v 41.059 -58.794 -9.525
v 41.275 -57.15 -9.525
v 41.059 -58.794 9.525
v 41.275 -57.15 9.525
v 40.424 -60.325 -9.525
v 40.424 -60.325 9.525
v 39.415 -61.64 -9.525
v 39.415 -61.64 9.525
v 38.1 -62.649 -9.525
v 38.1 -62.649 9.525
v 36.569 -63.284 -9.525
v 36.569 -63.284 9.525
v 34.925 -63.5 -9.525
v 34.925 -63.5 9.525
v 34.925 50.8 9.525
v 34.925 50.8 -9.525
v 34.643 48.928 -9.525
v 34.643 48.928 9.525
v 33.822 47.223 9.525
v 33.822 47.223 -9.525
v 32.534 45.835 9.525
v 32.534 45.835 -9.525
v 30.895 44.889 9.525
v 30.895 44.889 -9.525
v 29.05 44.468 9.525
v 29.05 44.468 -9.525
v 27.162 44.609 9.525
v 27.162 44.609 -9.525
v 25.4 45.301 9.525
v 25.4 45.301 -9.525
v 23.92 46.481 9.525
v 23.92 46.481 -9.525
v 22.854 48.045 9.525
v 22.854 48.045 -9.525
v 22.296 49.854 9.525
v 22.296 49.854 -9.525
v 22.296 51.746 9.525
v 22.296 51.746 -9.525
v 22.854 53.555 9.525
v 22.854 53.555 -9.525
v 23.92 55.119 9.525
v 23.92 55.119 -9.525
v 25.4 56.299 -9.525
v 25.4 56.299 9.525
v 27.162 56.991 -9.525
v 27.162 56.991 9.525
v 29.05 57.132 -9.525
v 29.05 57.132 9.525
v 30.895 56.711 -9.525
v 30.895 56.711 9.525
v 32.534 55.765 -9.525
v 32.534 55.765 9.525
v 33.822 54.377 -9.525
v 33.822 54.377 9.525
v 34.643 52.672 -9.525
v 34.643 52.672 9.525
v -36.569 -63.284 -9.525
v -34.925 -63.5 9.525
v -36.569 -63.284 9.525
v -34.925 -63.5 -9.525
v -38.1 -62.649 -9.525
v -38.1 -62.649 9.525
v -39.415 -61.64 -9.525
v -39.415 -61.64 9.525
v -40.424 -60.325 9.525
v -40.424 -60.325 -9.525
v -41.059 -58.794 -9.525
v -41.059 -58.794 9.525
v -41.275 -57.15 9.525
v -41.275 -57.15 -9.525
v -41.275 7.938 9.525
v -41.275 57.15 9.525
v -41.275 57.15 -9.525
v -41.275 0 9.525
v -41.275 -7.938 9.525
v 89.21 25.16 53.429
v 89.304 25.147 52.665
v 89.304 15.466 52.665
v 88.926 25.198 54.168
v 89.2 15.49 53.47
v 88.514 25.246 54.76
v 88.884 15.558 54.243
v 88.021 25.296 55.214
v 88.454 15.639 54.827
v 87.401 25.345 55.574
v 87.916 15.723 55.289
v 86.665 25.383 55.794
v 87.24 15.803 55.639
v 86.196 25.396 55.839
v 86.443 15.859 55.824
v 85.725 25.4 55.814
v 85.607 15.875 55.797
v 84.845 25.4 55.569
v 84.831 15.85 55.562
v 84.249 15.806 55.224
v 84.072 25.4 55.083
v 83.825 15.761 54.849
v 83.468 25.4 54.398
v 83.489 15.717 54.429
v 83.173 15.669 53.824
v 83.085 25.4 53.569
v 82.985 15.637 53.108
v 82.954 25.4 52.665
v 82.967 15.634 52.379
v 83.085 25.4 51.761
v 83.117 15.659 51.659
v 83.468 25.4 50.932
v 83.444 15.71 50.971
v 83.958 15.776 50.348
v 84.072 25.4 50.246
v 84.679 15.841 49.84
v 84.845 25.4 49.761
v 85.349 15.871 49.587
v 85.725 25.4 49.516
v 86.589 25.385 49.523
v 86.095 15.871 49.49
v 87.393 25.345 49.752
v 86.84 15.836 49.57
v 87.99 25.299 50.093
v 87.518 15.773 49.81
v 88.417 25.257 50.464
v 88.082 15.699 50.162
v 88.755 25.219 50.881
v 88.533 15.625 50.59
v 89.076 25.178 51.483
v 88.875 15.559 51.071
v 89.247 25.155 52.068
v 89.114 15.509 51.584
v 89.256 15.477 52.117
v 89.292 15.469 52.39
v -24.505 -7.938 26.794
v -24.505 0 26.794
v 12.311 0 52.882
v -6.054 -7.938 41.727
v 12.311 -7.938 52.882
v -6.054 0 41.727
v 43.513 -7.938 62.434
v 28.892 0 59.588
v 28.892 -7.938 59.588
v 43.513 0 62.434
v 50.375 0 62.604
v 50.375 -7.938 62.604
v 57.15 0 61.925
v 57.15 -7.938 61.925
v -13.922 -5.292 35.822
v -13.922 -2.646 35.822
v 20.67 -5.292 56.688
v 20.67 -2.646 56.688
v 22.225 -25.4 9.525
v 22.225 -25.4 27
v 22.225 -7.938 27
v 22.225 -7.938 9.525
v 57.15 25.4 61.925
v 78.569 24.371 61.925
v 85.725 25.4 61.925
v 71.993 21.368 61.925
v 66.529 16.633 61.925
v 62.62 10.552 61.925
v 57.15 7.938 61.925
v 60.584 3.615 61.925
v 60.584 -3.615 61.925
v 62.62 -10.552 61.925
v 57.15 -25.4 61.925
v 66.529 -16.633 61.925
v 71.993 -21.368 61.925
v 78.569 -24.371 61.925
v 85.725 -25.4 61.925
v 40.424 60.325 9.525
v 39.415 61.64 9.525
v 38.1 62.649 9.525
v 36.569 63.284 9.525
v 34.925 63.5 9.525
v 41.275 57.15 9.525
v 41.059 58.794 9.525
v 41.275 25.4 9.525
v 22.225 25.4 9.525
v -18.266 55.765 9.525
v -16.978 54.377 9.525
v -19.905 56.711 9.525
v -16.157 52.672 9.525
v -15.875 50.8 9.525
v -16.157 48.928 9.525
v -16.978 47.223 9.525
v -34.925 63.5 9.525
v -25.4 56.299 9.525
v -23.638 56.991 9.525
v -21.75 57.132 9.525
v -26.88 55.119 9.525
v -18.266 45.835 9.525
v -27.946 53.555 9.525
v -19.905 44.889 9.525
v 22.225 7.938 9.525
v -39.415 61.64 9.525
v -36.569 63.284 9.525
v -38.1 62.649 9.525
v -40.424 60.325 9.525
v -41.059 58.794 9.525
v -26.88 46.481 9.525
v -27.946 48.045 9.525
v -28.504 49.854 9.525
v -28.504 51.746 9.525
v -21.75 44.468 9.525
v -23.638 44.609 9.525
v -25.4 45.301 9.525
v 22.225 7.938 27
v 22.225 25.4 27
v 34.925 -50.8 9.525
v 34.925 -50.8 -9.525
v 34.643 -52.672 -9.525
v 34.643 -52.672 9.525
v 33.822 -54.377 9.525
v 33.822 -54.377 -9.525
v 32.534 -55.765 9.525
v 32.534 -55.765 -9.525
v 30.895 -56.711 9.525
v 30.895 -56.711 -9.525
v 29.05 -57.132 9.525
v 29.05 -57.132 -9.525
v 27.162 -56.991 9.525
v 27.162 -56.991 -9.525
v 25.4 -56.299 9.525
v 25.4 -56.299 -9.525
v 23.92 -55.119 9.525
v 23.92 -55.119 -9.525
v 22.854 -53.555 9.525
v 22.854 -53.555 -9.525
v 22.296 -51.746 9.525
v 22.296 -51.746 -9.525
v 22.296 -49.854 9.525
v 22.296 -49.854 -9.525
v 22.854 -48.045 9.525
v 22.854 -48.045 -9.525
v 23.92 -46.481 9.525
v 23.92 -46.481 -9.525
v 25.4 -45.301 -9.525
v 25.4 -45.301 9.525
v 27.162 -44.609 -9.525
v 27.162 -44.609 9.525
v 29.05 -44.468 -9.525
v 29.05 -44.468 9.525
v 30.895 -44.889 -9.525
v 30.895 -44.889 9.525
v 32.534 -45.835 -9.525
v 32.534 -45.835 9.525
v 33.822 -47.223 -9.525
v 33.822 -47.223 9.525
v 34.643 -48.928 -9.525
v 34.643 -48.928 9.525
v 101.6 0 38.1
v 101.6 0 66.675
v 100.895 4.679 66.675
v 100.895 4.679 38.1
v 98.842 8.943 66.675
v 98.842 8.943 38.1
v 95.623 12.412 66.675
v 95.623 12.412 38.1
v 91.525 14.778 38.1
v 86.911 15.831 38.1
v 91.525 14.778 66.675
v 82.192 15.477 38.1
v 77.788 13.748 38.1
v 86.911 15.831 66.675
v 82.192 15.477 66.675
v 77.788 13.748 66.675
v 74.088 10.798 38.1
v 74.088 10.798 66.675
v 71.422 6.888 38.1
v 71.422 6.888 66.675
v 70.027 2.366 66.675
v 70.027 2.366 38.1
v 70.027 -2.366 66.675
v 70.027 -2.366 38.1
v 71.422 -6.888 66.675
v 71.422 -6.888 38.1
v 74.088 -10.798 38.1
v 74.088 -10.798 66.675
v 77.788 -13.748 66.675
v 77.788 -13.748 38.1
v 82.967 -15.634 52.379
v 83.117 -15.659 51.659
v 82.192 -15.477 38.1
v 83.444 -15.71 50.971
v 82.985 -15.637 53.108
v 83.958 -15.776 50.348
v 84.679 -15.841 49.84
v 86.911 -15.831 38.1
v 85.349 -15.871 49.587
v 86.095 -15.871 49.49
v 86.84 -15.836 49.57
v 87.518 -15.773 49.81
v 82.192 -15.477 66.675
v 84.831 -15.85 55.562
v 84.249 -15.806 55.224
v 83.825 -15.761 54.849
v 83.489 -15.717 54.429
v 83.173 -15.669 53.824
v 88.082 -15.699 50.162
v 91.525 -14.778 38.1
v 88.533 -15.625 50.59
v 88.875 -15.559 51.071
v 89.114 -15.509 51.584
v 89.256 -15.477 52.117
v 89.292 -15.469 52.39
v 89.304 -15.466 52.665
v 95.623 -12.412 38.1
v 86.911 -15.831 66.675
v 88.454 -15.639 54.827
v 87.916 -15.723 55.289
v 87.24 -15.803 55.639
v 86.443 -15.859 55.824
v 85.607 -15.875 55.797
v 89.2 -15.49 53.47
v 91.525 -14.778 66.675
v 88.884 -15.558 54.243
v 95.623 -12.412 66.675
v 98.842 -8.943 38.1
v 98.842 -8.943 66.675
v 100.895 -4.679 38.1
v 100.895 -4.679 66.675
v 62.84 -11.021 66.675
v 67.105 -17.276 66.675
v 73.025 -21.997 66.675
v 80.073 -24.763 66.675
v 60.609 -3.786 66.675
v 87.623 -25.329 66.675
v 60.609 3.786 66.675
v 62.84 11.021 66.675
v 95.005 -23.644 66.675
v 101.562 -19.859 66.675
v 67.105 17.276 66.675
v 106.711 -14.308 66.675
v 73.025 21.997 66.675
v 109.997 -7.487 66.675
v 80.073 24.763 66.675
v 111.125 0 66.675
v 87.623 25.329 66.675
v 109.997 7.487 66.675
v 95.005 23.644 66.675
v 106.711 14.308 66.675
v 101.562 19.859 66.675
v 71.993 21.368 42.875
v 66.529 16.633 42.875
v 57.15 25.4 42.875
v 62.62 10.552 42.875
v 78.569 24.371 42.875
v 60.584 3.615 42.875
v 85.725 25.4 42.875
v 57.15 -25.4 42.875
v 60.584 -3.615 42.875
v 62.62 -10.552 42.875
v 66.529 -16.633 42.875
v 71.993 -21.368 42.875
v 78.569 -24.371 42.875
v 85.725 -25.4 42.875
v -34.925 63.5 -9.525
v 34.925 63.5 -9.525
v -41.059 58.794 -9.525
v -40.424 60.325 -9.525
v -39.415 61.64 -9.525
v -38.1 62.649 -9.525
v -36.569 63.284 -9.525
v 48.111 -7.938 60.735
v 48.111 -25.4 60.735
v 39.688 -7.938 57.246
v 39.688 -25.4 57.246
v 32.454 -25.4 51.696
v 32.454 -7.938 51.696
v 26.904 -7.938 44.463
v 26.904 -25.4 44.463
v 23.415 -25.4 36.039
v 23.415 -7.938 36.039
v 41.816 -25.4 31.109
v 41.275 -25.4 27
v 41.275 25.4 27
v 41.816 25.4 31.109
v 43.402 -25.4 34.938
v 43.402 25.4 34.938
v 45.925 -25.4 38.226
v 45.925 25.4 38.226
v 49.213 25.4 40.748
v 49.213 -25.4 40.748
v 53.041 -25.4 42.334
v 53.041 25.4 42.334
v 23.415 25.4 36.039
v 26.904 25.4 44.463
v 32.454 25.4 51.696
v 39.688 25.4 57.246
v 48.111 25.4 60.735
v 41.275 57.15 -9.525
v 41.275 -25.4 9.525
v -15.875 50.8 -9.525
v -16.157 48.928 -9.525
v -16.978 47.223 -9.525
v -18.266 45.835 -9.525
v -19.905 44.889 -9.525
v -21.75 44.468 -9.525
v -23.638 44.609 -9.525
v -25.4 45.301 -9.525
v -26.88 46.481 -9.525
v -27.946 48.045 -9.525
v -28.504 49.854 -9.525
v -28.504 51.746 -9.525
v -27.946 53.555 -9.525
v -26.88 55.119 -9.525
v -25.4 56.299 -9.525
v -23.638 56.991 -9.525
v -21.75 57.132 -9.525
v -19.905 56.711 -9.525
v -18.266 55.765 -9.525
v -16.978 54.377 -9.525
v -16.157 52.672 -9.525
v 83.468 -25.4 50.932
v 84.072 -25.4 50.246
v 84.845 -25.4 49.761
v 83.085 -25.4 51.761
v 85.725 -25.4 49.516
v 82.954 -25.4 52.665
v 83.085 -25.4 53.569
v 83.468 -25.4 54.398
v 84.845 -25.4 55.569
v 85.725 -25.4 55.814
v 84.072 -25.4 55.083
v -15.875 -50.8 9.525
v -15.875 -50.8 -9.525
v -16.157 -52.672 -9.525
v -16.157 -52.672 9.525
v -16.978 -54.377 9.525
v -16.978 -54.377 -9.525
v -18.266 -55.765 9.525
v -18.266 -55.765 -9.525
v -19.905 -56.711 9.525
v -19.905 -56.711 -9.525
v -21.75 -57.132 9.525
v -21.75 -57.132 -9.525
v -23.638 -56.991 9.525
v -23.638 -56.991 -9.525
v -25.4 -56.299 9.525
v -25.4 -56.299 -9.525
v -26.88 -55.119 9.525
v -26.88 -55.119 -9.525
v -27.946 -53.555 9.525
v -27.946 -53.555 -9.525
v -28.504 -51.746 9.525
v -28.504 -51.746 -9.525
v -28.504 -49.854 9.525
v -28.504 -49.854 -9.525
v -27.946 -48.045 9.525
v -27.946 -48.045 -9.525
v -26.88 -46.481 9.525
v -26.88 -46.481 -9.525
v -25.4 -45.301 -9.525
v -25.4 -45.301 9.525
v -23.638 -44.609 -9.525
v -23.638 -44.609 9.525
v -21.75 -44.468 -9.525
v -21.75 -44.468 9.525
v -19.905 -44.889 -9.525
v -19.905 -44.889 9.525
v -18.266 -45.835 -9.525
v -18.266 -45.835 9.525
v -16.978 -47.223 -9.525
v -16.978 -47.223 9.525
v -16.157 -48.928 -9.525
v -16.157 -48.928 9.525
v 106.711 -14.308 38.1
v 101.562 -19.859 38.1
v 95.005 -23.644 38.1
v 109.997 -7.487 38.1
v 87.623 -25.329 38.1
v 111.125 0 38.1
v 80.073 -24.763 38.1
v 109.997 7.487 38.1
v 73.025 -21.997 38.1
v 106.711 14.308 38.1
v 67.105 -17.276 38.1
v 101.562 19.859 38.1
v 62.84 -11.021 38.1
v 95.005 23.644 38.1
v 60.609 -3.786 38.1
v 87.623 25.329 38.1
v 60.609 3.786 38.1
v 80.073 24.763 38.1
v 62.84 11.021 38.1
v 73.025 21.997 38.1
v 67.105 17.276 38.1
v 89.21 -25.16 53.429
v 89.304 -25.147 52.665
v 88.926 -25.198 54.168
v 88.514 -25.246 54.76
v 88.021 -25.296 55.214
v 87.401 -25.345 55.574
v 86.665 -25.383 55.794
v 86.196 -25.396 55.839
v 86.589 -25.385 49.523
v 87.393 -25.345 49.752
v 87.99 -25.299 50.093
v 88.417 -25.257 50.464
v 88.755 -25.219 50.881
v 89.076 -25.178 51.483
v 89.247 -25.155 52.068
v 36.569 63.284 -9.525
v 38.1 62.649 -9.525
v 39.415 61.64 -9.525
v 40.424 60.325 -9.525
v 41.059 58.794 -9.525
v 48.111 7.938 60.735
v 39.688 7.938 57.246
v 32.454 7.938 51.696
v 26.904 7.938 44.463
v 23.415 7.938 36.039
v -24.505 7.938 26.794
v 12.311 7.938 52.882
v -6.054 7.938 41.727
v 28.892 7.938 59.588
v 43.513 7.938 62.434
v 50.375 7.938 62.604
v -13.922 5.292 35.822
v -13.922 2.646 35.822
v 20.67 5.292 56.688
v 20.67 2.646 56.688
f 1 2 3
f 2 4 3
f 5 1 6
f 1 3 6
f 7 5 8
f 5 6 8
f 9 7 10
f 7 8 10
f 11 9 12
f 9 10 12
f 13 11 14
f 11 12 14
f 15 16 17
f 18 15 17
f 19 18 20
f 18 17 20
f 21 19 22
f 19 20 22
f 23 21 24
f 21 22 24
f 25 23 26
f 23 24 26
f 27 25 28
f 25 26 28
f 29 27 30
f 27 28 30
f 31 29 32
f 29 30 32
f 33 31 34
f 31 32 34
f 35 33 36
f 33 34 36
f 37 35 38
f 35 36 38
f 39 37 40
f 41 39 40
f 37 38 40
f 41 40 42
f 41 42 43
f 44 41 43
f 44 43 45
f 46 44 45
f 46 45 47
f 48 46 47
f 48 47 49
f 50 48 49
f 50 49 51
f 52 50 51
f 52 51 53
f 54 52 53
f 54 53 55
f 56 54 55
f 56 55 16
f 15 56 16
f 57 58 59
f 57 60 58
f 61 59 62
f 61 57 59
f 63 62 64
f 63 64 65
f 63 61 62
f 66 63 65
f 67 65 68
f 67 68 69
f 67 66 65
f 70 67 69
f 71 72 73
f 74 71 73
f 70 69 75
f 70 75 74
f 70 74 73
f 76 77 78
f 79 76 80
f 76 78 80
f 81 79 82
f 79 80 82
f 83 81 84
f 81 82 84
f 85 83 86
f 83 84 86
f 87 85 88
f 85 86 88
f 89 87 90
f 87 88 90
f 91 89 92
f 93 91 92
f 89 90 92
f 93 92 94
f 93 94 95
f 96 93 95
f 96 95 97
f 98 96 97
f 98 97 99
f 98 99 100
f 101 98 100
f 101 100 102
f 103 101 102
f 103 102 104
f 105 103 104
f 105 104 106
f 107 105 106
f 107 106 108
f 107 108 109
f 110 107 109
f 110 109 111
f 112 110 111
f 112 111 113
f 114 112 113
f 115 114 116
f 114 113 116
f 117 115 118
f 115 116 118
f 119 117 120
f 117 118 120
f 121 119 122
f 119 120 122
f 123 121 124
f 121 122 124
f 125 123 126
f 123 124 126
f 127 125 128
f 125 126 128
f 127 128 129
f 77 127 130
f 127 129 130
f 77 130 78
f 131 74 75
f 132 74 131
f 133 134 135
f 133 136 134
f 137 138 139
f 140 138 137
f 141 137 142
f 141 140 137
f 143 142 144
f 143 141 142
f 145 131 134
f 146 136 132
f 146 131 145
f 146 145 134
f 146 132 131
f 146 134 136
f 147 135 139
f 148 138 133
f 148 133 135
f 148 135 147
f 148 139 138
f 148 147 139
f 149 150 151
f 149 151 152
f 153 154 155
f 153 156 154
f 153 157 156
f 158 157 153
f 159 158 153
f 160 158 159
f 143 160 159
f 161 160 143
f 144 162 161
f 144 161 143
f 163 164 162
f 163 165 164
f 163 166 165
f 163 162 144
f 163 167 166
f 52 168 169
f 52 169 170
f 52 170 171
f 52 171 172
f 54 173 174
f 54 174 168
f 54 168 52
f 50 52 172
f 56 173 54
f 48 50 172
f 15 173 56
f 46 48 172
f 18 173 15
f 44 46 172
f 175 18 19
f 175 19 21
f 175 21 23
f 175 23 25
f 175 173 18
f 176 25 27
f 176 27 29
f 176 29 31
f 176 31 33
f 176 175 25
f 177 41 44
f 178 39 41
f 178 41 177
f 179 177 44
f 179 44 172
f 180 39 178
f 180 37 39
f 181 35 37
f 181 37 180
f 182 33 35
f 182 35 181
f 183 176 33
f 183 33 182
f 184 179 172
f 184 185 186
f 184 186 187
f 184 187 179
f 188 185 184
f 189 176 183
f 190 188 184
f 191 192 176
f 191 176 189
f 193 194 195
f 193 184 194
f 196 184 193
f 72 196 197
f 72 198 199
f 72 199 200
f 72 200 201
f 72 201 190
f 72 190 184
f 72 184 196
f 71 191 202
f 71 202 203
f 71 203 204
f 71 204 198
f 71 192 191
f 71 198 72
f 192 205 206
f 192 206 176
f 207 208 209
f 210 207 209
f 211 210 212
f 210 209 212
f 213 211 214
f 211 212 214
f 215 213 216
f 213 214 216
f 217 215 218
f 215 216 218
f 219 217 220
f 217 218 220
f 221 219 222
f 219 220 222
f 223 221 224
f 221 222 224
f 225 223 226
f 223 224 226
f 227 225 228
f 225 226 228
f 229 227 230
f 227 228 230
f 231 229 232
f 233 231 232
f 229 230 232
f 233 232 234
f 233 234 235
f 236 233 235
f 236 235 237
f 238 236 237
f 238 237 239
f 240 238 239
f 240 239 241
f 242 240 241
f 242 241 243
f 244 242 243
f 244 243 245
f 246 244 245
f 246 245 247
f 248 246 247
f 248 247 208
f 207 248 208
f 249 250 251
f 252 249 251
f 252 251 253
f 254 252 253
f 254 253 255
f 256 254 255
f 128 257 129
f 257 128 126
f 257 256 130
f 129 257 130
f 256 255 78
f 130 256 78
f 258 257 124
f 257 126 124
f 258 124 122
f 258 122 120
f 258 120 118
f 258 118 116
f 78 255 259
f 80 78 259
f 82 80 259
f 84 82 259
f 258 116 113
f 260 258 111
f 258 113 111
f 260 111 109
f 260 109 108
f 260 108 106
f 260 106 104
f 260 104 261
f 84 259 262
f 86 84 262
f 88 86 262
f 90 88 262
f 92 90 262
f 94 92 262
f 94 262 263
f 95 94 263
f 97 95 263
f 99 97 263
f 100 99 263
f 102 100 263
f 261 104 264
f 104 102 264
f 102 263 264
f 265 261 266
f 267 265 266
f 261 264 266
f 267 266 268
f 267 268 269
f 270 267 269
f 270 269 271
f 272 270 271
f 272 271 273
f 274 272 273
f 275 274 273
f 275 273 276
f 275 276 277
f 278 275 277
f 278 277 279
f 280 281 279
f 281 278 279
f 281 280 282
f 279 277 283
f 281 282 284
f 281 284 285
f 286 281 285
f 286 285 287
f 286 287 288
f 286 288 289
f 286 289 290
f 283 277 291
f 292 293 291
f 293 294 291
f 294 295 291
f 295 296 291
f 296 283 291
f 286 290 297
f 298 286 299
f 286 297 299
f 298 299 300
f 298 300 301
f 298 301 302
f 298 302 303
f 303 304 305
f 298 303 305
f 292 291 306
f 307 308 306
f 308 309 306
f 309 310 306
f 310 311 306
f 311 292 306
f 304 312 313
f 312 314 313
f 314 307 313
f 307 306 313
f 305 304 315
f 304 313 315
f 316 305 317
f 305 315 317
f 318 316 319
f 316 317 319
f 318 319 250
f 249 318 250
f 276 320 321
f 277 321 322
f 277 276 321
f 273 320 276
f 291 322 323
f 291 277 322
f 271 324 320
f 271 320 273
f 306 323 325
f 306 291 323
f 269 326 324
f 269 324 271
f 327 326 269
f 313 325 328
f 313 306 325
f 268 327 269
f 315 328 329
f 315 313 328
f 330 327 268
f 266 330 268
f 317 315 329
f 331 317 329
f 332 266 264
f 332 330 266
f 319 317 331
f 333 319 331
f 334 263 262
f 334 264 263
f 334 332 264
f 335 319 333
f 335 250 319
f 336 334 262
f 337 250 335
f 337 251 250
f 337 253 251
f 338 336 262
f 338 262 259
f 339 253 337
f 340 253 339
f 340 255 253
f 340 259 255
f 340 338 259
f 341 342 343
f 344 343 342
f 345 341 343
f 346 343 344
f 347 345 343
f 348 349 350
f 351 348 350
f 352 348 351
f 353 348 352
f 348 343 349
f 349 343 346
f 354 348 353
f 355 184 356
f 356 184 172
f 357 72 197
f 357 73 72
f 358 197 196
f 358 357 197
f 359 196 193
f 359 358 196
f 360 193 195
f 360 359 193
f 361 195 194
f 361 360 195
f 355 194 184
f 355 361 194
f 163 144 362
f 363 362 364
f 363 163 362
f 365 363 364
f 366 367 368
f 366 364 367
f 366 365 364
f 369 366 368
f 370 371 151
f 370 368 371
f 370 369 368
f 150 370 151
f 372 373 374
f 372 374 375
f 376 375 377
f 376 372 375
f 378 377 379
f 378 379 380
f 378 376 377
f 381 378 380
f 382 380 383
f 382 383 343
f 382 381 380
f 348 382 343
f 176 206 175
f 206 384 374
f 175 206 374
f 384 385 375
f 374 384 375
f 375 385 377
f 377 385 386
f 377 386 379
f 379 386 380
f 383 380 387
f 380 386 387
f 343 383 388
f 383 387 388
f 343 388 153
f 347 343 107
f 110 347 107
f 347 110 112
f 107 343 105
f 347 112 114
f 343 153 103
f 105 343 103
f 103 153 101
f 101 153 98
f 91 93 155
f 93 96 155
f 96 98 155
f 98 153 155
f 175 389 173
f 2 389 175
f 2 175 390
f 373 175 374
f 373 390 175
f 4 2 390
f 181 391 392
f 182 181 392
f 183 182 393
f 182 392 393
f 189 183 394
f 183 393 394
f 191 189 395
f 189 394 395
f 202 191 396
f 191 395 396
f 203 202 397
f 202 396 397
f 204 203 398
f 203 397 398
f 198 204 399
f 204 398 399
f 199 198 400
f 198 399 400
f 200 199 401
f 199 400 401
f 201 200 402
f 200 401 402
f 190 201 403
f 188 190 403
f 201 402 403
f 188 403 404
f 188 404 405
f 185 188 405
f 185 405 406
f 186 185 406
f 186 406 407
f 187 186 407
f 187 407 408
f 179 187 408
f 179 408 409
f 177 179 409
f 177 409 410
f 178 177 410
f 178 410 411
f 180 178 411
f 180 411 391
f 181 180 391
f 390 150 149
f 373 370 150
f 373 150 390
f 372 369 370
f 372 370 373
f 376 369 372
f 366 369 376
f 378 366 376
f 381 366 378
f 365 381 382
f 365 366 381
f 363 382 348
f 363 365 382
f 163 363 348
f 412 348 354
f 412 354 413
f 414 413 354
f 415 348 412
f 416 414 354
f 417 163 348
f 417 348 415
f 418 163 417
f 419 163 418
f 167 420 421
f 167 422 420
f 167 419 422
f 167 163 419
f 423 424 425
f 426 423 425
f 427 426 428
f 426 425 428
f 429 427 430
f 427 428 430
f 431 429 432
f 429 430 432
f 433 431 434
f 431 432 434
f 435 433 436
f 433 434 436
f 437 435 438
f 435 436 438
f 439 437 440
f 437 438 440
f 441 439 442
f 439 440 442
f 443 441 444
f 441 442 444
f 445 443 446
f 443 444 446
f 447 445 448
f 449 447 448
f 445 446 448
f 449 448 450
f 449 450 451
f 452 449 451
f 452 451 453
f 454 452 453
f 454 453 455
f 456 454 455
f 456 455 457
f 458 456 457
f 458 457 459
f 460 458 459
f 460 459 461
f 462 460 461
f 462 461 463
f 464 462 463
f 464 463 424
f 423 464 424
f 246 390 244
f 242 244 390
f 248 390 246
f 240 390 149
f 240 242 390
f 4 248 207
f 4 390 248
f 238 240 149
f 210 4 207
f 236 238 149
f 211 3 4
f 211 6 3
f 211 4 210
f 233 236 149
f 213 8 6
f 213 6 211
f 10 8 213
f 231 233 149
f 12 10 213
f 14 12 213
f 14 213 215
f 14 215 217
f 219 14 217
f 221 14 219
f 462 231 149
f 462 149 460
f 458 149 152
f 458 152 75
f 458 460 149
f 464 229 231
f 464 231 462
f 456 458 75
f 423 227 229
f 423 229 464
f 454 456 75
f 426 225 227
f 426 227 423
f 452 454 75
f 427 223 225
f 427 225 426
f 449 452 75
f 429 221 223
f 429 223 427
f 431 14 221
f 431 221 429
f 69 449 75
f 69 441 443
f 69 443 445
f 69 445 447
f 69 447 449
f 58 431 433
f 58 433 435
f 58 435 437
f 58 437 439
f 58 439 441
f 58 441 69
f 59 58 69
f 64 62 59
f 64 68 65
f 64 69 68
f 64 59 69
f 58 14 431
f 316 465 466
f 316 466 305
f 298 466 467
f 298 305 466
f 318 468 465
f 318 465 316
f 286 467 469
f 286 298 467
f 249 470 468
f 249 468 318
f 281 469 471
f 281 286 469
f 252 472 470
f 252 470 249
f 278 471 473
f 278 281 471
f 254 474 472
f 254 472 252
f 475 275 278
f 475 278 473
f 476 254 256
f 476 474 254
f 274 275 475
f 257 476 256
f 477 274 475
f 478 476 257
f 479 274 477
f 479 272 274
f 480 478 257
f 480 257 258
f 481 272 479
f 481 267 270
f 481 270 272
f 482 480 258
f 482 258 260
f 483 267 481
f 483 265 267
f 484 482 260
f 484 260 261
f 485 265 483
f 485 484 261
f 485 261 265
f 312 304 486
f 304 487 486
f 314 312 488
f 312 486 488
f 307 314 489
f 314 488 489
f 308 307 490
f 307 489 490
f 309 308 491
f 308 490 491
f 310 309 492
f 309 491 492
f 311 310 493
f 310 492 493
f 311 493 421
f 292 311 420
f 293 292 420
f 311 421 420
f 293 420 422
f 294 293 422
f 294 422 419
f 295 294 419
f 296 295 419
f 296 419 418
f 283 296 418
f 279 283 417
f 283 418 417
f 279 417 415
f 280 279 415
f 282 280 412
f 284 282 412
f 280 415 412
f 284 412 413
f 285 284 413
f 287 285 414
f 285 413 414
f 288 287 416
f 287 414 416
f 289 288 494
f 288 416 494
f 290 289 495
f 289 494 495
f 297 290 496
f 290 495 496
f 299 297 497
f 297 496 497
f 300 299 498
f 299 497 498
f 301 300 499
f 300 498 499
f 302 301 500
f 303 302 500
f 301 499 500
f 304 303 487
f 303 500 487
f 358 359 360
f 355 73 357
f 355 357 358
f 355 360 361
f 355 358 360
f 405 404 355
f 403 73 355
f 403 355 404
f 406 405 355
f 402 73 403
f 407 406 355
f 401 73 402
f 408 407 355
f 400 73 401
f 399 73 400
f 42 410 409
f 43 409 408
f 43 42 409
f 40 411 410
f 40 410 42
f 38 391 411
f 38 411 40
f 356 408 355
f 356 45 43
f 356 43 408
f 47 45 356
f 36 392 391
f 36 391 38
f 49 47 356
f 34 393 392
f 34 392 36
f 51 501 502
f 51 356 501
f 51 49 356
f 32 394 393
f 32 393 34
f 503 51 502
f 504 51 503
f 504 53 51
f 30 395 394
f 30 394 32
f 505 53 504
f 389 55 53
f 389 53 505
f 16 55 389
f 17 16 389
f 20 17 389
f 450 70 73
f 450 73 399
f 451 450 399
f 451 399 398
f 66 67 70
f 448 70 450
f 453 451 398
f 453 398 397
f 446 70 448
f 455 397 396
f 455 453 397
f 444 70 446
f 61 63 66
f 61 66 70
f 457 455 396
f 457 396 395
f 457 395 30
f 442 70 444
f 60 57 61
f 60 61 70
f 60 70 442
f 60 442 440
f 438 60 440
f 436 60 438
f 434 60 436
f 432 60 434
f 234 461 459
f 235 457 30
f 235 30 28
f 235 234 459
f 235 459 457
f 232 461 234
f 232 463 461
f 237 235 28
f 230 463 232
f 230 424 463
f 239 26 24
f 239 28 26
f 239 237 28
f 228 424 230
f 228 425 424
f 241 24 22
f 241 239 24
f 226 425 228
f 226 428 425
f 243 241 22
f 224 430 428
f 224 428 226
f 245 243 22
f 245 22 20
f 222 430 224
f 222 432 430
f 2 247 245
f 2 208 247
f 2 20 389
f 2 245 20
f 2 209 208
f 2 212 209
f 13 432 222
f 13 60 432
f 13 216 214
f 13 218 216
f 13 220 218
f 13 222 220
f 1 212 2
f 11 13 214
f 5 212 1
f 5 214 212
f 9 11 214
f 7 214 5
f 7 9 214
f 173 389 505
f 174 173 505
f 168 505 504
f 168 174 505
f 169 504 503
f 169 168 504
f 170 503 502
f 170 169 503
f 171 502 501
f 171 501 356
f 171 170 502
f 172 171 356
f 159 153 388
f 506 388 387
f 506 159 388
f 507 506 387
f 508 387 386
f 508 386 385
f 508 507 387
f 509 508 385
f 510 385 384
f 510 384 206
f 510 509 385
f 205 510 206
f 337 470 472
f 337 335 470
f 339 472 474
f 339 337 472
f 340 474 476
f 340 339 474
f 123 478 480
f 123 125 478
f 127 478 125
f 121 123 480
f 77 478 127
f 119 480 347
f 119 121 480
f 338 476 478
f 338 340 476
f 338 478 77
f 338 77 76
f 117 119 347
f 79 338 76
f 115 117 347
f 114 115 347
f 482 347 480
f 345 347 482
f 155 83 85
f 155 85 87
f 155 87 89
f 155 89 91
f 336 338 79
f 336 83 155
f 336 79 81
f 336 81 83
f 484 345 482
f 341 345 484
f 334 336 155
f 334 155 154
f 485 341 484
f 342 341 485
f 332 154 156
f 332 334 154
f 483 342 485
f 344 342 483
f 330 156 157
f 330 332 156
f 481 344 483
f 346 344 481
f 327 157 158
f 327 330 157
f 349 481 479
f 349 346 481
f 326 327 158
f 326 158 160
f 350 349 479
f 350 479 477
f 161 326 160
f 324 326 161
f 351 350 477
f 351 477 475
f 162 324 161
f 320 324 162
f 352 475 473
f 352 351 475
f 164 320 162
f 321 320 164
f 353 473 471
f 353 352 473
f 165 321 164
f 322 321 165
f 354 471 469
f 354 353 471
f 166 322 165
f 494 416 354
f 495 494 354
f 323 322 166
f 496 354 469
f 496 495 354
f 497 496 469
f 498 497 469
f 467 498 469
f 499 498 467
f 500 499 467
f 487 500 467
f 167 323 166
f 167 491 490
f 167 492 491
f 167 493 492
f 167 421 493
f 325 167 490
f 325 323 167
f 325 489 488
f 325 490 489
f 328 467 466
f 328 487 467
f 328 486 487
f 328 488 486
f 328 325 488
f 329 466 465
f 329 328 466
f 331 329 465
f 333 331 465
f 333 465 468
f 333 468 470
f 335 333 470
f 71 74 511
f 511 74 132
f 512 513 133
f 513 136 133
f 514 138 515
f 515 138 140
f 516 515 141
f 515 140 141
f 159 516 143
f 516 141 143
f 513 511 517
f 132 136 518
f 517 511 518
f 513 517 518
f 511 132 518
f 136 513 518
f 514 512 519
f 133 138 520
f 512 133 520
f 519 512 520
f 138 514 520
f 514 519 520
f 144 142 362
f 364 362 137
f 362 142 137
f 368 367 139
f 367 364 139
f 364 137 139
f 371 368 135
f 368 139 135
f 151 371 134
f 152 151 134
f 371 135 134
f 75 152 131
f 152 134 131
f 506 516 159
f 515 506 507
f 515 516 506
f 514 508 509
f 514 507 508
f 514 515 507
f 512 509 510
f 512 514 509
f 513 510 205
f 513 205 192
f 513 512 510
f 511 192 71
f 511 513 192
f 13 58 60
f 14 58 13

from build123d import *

# Parameters (mm, degrees)
F1_DEPTH  = 63.5
F0_W      = 25.4
F0_H      = 19.05
F2_DEPTH  = 25.4
F3_DEPTH  = 7.9375
F5_R      = 6.35
F6_R      = 15.875
F7_DEPTH  = 76.201
F8_R      = 6.35
F9_DEPTH  = 76.201
F10_R     = 3.175
F11_DEPTH = 31.75


with BuildPart() as f1:
    # F0 (on Front) → F1 (new body, symmetric)
    with BuildSketch(Plane.XZ):
        Polygon((-41.275, 9.525), (-41.275, -9.525), (41.275, -9.525), (41.275, 9.525), (22.225, 9.525), align=None)
    extrude(amount=F1_DEPTH, both=True)

    # F0 (on Front) → F2 (join, symmetric)
    with BuildSketch(Plane.XZ):
        with BuildLine():
            Line((22.225, 9.525), (41.275, 9.525))
            Line((41.275, 9.525), (41.275, 27.0002))
            ThreePointArc((41.275, 27.0002), (45.9246798487, 38.2255201513), (57.15, 42.8752))
            Line((57.15, 42.8752), (60.325, 42.8752))
            Line((60.325, 42.8752), (60.325, 61.9252))
            Line((60.325, 61.9252), (57.15, 61.9252))
            ThreePointArc((57.15, 61.9252), (32.4542956671, 51.6959043329), (22.225, 27.0002))
            Line((22.225, 27.0002), (22.225, 9.525))
        make_face()
        with Locations((73.025, 52.4002)):
            Rectangle(F0_W, F0_H)
    extrude(amount=F2_DEPTH, both=True)

    # F0 (on Front) → F3 (join, symmetric)
    with BuildSketch(Plane.XZ):
        with BuildLine():
            add(Edge.make_bspline(
                [(-41.275, 9.525), (-19.3256400526, 35.1379215717), (21.5103253722, 67.9016634822), (57.15, 61.9252)],
                knots=[0, 0, 0, 0, 111.5045361635, 111.5045361635, 111.5045361635, 111.5045361635], degree=3))
            Line((-41.275, 9.525), (22.225, 9.525))
            Line((22.225, 9.525), (22.225, 27.0002))
            ThreePointArc((22.225, 27.0002), (32.4542956671, 51.6959043329), (57.15, 61.9252))
        make_face()
    extrude(amount=F3_DEPTH, both=True)

    # F0 (on Front) → F4 (revolve)
    with BuildSketch(Plane.XZ):
        Polygon((85.725, 66.675), (85.725, 61.9252), (85.725, 42.8752), (85.725, 38.1), (111.125, 38.1), (111.125, 66.675), align=None)
    revolve(axis=Axis((85.725, 0, 52.3875), (0, 0, 1)))

    # F5
    f5_edges = [f1.edges().sort_by_distance(p)[0] for p in [
        (-41.275, -63.5, 0),
        (41.275, -63.5, 0),
        (41.275, 63.5, 0),
        (-41.275, 63.5, 0),
    ]]
    fillet(f5_edges, radius=F5_R)

    # F6 (on face) → F7 (cut, through all)
    with BuildSketch(Plane.XY.offset(66.675)):
        with Locations((85.725, 0)):
            Circle(F6_R)
    extrude(amount=-F7_DEPTH, mode=Mode.SUBTRACT)

    # F8 (on face) → F9 (cut, through all)
    with BuildSketch(Plane(origin=(0, 0, -9.525), x_dir=(1, 0, 0), z_dir=(0, 0, -1))):
        with Locations((28.575, 50.8)):
            Circle(F8_R)
        with Locations((-22.225, 50.8)):
            Circle(F8_R)
        with Locations((-22.225, -50.8)):
            Circle(F8_R)
        with Locations((28.575, -50.8)):
            Circle(F8_R)
    extrude(amount=-F9_DEPTH, mode=Mode.SUBTRACT)

    # F10 (on face) → F11 (cut, symmetric)
    with BuildSketch(Plane.XZ):
        with Locations((86.1288532615, 52.6647157967)):
            Circle(F10_R)
    extrude(amount=F11_DEPTH, both=True, mode=Mode.SUBTRACT)


solid = f1.part
